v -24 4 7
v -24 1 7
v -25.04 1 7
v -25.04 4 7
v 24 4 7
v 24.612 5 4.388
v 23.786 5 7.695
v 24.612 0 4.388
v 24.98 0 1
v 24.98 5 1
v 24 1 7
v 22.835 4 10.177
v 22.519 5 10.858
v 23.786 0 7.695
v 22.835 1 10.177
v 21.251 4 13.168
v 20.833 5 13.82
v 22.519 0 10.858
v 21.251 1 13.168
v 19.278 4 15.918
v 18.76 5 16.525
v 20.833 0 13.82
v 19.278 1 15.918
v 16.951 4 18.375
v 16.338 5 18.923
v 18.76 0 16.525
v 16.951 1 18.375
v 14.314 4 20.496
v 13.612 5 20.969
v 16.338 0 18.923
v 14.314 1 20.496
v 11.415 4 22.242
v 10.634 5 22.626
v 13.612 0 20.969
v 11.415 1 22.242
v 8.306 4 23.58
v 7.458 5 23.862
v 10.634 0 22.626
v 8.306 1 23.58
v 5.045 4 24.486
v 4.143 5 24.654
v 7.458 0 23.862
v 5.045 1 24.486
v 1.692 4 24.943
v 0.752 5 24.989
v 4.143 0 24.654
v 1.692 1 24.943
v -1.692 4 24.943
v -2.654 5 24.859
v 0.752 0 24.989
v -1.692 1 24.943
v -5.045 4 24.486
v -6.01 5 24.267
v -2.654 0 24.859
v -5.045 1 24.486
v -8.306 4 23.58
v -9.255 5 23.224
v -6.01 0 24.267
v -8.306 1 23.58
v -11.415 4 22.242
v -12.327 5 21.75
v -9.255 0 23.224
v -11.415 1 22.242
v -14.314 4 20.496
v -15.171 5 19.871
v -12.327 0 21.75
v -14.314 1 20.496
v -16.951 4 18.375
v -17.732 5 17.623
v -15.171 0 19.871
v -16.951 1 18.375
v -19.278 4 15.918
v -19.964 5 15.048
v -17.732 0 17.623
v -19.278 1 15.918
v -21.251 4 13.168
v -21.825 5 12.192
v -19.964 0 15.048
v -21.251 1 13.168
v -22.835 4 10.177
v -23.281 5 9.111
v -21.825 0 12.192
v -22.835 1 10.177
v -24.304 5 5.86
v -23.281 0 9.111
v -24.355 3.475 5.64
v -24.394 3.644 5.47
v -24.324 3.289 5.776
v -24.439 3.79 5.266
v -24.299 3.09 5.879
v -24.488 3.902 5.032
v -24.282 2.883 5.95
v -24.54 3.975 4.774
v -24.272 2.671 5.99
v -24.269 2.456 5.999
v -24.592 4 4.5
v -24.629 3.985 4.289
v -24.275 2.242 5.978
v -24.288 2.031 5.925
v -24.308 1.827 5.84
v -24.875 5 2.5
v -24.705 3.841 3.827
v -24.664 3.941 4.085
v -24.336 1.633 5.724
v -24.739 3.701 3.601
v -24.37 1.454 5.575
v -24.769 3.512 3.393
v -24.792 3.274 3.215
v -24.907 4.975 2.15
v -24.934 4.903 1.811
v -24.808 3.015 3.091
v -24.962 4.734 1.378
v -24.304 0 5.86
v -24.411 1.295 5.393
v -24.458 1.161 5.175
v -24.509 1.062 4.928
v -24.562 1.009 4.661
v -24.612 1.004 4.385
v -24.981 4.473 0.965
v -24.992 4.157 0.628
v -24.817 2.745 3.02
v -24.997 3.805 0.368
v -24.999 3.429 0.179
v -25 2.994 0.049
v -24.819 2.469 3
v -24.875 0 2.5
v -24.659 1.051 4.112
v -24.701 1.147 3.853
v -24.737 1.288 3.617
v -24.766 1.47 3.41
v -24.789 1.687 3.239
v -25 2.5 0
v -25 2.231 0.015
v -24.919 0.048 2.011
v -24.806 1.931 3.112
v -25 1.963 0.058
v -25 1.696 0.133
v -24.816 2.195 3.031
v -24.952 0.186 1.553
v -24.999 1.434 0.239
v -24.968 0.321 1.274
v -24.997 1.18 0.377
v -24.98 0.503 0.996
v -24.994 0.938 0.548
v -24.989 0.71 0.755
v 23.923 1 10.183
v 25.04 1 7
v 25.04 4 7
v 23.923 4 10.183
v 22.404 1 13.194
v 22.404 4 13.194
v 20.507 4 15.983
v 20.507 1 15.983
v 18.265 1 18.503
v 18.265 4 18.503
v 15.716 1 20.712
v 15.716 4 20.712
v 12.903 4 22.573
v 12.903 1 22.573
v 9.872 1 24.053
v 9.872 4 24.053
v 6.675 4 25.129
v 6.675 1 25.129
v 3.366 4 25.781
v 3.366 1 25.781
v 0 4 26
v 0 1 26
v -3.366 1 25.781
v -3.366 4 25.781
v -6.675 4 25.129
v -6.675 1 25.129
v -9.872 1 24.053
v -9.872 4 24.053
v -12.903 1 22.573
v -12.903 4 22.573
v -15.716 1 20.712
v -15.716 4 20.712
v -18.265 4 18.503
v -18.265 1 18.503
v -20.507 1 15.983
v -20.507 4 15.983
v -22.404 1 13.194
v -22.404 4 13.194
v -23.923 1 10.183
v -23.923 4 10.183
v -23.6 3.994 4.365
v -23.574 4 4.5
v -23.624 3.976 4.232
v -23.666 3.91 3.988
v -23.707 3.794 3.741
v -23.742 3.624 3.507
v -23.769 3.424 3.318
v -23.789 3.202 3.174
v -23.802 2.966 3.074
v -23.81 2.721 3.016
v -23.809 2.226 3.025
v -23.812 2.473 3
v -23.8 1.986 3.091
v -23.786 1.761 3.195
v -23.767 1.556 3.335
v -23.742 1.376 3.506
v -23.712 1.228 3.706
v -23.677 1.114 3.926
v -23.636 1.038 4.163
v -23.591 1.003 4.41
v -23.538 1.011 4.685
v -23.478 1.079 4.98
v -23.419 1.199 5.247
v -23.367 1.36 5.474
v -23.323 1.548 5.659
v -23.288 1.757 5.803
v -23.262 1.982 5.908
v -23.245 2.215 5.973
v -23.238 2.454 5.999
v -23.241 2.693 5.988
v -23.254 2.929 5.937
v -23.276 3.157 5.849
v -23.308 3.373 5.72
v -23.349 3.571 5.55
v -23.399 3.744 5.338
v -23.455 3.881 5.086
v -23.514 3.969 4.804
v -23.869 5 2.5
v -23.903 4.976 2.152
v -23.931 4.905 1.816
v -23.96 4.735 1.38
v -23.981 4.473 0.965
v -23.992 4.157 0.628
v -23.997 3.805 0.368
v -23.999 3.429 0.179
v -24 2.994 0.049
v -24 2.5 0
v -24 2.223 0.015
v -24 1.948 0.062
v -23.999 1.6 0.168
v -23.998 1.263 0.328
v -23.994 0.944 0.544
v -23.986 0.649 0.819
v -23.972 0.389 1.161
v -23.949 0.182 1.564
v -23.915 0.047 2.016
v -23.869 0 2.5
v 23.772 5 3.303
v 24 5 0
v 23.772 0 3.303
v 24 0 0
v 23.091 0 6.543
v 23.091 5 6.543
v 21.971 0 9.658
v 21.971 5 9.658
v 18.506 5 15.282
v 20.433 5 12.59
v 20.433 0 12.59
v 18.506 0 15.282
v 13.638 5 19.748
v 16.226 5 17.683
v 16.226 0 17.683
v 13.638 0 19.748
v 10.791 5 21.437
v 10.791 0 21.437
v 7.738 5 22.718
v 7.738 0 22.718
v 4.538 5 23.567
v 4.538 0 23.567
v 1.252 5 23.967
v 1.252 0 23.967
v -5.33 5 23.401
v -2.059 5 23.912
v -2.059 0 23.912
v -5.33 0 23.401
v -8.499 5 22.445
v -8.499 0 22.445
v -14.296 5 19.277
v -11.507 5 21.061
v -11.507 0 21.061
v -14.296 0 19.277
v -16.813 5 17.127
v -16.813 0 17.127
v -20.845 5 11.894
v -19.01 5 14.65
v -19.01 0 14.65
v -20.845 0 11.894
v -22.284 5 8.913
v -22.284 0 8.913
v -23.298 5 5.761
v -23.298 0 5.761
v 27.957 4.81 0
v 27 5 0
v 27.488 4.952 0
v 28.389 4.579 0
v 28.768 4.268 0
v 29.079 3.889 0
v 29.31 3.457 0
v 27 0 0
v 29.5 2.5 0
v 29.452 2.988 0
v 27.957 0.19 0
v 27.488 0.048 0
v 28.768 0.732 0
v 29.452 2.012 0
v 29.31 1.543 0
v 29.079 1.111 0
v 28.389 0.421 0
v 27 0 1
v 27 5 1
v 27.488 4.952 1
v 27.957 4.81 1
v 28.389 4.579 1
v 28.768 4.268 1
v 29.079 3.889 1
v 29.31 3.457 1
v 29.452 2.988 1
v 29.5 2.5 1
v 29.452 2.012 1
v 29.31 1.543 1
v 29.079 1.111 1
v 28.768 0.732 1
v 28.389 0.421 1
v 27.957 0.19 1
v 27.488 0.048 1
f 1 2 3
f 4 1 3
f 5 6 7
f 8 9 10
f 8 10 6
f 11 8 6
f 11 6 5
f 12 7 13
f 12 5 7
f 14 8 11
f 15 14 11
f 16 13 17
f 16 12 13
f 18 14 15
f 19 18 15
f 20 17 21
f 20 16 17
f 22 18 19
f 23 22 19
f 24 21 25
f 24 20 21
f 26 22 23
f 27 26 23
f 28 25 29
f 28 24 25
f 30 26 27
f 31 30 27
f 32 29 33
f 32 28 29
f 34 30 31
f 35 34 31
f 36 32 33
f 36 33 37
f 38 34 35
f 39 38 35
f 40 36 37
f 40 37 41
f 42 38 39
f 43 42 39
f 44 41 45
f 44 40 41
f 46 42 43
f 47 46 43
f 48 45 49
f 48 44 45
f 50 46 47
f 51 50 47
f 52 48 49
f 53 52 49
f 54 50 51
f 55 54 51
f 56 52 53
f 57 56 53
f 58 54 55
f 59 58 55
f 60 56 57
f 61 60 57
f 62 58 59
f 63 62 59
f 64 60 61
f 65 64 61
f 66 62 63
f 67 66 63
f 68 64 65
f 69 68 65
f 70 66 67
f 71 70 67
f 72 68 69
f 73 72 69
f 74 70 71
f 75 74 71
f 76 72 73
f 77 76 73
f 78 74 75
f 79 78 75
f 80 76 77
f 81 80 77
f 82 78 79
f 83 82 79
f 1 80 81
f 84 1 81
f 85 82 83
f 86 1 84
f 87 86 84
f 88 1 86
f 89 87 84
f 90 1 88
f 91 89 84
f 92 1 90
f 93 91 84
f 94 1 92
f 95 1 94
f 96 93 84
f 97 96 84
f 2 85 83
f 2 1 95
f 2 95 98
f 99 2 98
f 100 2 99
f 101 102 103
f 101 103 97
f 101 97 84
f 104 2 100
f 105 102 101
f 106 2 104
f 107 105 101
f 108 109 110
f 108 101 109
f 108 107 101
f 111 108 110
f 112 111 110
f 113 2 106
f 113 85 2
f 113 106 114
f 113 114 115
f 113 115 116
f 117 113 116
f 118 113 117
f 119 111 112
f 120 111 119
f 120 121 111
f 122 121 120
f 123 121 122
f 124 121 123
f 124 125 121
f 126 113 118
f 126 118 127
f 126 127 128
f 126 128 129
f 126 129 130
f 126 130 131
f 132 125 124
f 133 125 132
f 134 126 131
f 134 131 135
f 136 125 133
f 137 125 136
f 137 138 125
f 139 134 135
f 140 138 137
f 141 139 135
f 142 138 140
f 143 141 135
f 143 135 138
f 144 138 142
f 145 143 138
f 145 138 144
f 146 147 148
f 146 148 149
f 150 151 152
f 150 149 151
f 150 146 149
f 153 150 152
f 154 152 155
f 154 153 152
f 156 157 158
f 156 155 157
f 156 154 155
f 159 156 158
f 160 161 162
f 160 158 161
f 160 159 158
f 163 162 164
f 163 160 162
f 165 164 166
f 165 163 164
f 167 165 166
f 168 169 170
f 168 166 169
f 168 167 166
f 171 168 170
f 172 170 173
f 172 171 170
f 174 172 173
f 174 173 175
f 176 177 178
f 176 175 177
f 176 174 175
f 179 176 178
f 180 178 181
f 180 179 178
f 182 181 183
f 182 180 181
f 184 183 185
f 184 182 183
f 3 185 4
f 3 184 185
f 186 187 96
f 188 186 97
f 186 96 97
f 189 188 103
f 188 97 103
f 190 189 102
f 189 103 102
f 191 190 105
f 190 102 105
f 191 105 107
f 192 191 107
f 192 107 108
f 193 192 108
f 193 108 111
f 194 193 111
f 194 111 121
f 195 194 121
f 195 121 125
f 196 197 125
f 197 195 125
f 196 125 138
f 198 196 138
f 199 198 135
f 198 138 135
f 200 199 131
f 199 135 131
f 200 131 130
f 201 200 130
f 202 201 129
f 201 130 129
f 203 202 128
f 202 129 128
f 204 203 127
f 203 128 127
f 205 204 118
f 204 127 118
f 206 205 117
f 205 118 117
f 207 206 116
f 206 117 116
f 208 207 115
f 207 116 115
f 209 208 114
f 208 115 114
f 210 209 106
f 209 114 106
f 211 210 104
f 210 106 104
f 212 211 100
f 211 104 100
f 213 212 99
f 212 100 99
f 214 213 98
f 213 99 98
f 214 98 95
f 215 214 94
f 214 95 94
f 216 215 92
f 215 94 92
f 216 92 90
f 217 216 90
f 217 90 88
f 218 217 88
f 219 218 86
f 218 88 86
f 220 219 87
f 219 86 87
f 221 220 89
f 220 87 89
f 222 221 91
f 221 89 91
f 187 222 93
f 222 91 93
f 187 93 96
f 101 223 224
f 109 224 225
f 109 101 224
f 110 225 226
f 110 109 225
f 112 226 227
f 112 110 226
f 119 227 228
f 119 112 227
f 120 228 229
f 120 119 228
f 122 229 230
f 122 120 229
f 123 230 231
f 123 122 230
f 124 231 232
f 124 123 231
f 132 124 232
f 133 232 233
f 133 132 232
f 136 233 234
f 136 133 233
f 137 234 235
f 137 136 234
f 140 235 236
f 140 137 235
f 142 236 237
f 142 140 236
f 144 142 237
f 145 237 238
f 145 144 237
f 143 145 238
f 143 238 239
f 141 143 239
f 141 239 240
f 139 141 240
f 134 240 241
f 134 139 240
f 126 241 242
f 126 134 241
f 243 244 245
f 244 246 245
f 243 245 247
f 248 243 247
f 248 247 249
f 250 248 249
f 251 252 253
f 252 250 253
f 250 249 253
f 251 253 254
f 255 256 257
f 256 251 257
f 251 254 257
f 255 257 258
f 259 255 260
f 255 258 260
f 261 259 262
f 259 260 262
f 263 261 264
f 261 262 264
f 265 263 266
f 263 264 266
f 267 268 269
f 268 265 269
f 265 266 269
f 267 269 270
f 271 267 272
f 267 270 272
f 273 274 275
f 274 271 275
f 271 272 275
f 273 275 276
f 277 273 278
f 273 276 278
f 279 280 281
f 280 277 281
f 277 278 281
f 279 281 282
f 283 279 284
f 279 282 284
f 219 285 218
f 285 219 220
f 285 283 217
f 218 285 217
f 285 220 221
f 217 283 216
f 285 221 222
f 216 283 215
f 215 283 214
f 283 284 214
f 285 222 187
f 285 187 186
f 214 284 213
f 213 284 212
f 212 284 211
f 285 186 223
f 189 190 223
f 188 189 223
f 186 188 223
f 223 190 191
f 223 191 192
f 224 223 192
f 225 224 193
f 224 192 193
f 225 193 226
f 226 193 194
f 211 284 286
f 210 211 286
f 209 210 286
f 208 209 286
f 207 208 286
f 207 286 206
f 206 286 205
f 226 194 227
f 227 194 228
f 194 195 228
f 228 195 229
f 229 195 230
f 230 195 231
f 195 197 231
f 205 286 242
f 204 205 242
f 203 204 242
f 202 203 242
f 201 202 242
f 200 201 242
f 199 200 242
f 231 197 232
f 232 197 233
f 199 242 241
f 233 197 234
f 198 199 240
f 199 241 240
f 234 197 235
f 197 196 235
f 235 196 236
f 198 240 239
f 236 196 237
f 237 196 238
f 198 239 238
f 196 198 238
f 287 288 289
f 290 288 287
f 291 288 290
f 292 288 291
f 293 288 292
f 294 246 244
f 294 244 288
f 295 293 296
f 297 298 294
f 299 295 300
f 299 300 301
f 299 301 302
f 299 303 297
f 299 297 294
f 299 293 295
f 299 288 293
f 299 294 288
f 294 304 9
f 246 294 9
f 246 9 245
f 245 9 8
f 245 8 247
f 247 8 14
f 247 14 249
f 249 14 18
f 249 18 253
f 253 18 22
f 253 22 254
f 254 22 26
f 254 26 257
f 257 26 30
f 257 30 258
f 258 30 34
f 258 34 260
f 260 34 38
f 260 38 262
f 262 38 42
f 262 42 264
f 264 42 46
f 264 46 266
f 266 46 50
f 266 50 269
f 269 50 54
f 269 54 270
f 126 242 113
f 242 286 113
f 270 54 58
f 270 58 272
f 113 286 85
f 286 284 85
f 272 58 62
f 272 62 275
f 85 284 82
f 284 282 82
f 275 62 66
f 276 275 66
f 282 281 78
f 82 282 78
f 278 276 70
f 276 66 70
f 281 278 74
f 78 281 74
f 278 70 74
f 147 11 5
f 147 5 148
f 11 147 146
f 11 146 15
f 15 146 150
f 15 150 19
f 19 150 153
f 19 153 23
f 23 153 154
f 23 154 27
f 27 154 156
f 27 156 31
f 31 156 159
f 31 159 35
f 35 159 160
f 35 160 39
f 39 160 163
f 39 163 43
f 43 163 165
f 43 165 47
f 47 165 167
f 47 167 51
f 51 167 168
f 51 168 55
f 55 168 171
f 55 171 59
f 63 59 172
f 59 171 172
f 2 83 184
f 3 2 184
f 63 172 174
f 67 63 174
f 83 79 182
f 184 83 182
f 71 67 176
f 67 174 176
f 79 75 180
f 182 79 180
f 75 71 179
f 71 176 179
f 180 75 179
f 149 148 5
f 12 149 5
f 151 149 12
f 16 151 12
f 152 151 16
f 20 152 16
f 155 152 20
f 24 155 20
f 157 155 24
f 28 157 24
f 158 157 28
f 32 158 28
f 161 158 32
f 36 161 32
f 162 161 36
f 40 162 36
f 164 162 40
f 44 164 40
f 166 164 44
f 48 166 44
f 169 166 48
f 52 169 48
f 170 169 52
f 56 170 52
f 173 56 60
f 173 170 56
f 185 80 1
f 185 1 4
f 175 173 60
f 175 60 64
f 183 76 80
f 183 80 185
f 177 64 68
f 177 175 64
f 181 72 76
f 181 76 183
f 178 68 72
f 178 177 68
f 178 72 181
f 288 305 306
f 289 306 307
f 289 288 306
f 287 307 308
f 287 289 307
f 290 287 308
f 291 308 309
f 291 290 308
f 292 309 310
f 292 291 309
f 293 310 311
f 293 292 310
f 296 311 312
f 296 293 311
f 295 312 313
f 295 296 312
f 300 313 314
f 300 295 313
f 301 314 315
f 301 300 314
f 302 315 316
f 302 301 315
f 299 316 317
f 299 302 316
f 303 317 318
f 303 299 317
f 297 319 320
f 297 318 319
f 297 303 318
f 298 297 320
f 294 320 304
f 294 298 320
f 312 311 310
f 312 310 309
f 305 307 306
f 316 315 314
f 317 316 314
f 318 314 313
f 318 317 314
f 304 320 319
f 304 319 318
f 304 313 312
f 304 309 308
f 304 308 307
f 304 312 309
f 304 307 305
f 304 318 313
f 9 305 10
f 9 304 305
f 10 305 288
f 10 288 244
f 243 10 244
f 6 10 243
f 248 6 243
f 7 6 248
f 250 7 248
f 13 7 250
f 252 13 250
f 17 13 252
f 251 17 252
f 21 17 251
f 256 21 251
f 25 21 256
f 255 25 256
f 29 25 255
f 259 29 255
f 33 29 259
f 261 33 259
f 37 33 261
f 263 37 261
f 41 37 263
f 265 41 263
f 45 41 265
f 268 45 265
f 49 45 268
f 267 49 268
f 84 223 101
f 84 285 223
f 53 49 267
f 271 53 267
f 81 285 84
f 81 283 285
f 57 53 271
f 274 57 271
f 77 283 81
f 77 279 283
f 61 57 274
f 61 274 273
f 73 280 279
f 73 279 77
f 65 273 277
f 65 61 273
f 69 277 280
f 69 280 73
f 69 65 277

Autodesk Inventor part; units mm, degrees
ref_plane "XY Plane" through (0, 0, 0) normal (0, 0, 1) x (1, 0, 0)
sketch "Sketch1" plane through (0, 0, 0) normal (0, 1, 0) x (-1, 0, 0)
  arc A0 (25, 0) -> (-24.98, 1) centre (0, 0) ccw
  arc A1 (24, 0) -> (-24, 0) centre (0, 0) ccw
  line L0 (25, 0) -> (24, 0)
  line L1 (-24, 0) -> (-25, 0)
  line L2 (-24, 0) -> (-29.5, 0)
  line L3 (-29.5, 0) -> (-29.5, 1)
  line L4 (-29.5, 1) -> (-24.98, 1)
  line L5 (-24, 1) -> (-24, 0)
extrude "Extrusion1" add sketch "Sketch1" along normal blind 5
sketch "Sketch2" plane through (29.5, 0, 0) normal (0, 0, -1) x (-1, 0, 0)
  line L0 (0, 0) -> (5.5, 0) projected
  arc A0 (2.5, 5) -> (2.5, 0) centre (2.5, 2.5) ccw
  line L1 (0, 0) -> (2.5, 0)
  line L2 (4.52, 0) -> (0, 0) projected
  line L3 (0, 0) -> (0, 2.5)
  line L4 (0, 0) -> (0, 5) projected
  line L5 (0, 2.5) -> (0, 5)
  line L6 (0, 5) -> (2.26, 5)
  line L7 (4.52, 5) -> (0, 5) projected
  line L8 (2.5, 5) -> (0, 5)
  line L9 (0, 2.5) -> (0, 5)
  line L10 (0, 2.5) -> (0, 0)
  line L11 (0, 0) -> (2.5, 0)
  arc A1 (0, 2.5) -> (2.5, 0) centre (2.5, 2.5) ccw
  arc A2 (2.5, 5) -> (0, 2.5) centre (2.5, 2.5) ccw
  point P0 (29.5, 0)
extrude "Extrusion2" cut sketch "Sketch2" against normal through all
ref_plane "Work Plane1" through (-25, 0, 0) normal (1, 0, 0) x (0, 1, 0)
sketch "Sketch3" plane through (-25, 0, 0) normal (1, 0, 0) x (0, 1, 0)
  line L0 (5, 0) -> (5, 25) construction
  line L1 (0, 0) -> (0, 2) construction
  line L2 (0, 0) -> (0, 25) construction
  line L3 (0, 0) -> (0, 2.5) construction
  arc A0 (0, 2.5) -> (5, 2.5) centre (2.5, 2.5) ccw
  line L4 (0, 0) -> (0, 2.5)
  line L5 (0, 0) -> (5, 0) projected
  line L6 (0, 0) -> (2.5, 0)
  line L7 (2.5, 0) -> (5, 0)
  line L8 (5, 0) -> (5, 2.5)
  arc A1 (0, 2.5) -> (2.5, 0) centre (2.5, 2.5) ccw
  arc A2 (2.5, 0) -> (5, 2.5) centre (2.5, 2.5) ccw
  point P0 (0, 1)
  point P1 (5, 1)
extrude "Extrusion3" cut sketch "Sketch3" along normal blind 3
sketch "Sketch4" plane through (-25, 0, 0) normal (1, 0, 0) x (0, 1, 0)
  line L0 (0, 0) -> (0, 4.5) construction
  line L1 (0, 24) -> (0, 0) construction
  line L2 (0, 4.5) -> (5, 4.5) construction
  line L3 (5, 24) -> (5, 0) construction
  circle A0 centre (2.5, 4.5) radius 1.5
  point P0 (0, 2.5)
  point P1 (5, 2.5)
  dimension "d15" = 4.5
  dimension "d16" = 3
extrude "Extrusion4" cut sketch "Sketch4" along normal blind 4
ref_plane "Work Plane2" through (0, 2.5, 0) normal (0, 1, 0) x (-1, 0, 0)
sketch "Sketch6" plane through (0, 2.5, 0) normal (0, 1, 0) x (-1, 0, 0)
  arc A0 (25.04, 7) -> (-25.04, 7) centre (0, 0) ccw
  line L0 (23.9792, 7) -> (25.04, 7)
  line L1 (-23.9792, 7) -> (-25.04, 7)
  arc A1 (23.9792, 7) -> (-23.9792, 7) centre (0, 0) ccw
  point P0 (0, 7)
  dimension "d22" = 52
  dimension "d23" = 7
extrude "Extrusion5" add sketch "Sketch6" along normal mid plane 3
properties part number "Metal icecream cutter"
